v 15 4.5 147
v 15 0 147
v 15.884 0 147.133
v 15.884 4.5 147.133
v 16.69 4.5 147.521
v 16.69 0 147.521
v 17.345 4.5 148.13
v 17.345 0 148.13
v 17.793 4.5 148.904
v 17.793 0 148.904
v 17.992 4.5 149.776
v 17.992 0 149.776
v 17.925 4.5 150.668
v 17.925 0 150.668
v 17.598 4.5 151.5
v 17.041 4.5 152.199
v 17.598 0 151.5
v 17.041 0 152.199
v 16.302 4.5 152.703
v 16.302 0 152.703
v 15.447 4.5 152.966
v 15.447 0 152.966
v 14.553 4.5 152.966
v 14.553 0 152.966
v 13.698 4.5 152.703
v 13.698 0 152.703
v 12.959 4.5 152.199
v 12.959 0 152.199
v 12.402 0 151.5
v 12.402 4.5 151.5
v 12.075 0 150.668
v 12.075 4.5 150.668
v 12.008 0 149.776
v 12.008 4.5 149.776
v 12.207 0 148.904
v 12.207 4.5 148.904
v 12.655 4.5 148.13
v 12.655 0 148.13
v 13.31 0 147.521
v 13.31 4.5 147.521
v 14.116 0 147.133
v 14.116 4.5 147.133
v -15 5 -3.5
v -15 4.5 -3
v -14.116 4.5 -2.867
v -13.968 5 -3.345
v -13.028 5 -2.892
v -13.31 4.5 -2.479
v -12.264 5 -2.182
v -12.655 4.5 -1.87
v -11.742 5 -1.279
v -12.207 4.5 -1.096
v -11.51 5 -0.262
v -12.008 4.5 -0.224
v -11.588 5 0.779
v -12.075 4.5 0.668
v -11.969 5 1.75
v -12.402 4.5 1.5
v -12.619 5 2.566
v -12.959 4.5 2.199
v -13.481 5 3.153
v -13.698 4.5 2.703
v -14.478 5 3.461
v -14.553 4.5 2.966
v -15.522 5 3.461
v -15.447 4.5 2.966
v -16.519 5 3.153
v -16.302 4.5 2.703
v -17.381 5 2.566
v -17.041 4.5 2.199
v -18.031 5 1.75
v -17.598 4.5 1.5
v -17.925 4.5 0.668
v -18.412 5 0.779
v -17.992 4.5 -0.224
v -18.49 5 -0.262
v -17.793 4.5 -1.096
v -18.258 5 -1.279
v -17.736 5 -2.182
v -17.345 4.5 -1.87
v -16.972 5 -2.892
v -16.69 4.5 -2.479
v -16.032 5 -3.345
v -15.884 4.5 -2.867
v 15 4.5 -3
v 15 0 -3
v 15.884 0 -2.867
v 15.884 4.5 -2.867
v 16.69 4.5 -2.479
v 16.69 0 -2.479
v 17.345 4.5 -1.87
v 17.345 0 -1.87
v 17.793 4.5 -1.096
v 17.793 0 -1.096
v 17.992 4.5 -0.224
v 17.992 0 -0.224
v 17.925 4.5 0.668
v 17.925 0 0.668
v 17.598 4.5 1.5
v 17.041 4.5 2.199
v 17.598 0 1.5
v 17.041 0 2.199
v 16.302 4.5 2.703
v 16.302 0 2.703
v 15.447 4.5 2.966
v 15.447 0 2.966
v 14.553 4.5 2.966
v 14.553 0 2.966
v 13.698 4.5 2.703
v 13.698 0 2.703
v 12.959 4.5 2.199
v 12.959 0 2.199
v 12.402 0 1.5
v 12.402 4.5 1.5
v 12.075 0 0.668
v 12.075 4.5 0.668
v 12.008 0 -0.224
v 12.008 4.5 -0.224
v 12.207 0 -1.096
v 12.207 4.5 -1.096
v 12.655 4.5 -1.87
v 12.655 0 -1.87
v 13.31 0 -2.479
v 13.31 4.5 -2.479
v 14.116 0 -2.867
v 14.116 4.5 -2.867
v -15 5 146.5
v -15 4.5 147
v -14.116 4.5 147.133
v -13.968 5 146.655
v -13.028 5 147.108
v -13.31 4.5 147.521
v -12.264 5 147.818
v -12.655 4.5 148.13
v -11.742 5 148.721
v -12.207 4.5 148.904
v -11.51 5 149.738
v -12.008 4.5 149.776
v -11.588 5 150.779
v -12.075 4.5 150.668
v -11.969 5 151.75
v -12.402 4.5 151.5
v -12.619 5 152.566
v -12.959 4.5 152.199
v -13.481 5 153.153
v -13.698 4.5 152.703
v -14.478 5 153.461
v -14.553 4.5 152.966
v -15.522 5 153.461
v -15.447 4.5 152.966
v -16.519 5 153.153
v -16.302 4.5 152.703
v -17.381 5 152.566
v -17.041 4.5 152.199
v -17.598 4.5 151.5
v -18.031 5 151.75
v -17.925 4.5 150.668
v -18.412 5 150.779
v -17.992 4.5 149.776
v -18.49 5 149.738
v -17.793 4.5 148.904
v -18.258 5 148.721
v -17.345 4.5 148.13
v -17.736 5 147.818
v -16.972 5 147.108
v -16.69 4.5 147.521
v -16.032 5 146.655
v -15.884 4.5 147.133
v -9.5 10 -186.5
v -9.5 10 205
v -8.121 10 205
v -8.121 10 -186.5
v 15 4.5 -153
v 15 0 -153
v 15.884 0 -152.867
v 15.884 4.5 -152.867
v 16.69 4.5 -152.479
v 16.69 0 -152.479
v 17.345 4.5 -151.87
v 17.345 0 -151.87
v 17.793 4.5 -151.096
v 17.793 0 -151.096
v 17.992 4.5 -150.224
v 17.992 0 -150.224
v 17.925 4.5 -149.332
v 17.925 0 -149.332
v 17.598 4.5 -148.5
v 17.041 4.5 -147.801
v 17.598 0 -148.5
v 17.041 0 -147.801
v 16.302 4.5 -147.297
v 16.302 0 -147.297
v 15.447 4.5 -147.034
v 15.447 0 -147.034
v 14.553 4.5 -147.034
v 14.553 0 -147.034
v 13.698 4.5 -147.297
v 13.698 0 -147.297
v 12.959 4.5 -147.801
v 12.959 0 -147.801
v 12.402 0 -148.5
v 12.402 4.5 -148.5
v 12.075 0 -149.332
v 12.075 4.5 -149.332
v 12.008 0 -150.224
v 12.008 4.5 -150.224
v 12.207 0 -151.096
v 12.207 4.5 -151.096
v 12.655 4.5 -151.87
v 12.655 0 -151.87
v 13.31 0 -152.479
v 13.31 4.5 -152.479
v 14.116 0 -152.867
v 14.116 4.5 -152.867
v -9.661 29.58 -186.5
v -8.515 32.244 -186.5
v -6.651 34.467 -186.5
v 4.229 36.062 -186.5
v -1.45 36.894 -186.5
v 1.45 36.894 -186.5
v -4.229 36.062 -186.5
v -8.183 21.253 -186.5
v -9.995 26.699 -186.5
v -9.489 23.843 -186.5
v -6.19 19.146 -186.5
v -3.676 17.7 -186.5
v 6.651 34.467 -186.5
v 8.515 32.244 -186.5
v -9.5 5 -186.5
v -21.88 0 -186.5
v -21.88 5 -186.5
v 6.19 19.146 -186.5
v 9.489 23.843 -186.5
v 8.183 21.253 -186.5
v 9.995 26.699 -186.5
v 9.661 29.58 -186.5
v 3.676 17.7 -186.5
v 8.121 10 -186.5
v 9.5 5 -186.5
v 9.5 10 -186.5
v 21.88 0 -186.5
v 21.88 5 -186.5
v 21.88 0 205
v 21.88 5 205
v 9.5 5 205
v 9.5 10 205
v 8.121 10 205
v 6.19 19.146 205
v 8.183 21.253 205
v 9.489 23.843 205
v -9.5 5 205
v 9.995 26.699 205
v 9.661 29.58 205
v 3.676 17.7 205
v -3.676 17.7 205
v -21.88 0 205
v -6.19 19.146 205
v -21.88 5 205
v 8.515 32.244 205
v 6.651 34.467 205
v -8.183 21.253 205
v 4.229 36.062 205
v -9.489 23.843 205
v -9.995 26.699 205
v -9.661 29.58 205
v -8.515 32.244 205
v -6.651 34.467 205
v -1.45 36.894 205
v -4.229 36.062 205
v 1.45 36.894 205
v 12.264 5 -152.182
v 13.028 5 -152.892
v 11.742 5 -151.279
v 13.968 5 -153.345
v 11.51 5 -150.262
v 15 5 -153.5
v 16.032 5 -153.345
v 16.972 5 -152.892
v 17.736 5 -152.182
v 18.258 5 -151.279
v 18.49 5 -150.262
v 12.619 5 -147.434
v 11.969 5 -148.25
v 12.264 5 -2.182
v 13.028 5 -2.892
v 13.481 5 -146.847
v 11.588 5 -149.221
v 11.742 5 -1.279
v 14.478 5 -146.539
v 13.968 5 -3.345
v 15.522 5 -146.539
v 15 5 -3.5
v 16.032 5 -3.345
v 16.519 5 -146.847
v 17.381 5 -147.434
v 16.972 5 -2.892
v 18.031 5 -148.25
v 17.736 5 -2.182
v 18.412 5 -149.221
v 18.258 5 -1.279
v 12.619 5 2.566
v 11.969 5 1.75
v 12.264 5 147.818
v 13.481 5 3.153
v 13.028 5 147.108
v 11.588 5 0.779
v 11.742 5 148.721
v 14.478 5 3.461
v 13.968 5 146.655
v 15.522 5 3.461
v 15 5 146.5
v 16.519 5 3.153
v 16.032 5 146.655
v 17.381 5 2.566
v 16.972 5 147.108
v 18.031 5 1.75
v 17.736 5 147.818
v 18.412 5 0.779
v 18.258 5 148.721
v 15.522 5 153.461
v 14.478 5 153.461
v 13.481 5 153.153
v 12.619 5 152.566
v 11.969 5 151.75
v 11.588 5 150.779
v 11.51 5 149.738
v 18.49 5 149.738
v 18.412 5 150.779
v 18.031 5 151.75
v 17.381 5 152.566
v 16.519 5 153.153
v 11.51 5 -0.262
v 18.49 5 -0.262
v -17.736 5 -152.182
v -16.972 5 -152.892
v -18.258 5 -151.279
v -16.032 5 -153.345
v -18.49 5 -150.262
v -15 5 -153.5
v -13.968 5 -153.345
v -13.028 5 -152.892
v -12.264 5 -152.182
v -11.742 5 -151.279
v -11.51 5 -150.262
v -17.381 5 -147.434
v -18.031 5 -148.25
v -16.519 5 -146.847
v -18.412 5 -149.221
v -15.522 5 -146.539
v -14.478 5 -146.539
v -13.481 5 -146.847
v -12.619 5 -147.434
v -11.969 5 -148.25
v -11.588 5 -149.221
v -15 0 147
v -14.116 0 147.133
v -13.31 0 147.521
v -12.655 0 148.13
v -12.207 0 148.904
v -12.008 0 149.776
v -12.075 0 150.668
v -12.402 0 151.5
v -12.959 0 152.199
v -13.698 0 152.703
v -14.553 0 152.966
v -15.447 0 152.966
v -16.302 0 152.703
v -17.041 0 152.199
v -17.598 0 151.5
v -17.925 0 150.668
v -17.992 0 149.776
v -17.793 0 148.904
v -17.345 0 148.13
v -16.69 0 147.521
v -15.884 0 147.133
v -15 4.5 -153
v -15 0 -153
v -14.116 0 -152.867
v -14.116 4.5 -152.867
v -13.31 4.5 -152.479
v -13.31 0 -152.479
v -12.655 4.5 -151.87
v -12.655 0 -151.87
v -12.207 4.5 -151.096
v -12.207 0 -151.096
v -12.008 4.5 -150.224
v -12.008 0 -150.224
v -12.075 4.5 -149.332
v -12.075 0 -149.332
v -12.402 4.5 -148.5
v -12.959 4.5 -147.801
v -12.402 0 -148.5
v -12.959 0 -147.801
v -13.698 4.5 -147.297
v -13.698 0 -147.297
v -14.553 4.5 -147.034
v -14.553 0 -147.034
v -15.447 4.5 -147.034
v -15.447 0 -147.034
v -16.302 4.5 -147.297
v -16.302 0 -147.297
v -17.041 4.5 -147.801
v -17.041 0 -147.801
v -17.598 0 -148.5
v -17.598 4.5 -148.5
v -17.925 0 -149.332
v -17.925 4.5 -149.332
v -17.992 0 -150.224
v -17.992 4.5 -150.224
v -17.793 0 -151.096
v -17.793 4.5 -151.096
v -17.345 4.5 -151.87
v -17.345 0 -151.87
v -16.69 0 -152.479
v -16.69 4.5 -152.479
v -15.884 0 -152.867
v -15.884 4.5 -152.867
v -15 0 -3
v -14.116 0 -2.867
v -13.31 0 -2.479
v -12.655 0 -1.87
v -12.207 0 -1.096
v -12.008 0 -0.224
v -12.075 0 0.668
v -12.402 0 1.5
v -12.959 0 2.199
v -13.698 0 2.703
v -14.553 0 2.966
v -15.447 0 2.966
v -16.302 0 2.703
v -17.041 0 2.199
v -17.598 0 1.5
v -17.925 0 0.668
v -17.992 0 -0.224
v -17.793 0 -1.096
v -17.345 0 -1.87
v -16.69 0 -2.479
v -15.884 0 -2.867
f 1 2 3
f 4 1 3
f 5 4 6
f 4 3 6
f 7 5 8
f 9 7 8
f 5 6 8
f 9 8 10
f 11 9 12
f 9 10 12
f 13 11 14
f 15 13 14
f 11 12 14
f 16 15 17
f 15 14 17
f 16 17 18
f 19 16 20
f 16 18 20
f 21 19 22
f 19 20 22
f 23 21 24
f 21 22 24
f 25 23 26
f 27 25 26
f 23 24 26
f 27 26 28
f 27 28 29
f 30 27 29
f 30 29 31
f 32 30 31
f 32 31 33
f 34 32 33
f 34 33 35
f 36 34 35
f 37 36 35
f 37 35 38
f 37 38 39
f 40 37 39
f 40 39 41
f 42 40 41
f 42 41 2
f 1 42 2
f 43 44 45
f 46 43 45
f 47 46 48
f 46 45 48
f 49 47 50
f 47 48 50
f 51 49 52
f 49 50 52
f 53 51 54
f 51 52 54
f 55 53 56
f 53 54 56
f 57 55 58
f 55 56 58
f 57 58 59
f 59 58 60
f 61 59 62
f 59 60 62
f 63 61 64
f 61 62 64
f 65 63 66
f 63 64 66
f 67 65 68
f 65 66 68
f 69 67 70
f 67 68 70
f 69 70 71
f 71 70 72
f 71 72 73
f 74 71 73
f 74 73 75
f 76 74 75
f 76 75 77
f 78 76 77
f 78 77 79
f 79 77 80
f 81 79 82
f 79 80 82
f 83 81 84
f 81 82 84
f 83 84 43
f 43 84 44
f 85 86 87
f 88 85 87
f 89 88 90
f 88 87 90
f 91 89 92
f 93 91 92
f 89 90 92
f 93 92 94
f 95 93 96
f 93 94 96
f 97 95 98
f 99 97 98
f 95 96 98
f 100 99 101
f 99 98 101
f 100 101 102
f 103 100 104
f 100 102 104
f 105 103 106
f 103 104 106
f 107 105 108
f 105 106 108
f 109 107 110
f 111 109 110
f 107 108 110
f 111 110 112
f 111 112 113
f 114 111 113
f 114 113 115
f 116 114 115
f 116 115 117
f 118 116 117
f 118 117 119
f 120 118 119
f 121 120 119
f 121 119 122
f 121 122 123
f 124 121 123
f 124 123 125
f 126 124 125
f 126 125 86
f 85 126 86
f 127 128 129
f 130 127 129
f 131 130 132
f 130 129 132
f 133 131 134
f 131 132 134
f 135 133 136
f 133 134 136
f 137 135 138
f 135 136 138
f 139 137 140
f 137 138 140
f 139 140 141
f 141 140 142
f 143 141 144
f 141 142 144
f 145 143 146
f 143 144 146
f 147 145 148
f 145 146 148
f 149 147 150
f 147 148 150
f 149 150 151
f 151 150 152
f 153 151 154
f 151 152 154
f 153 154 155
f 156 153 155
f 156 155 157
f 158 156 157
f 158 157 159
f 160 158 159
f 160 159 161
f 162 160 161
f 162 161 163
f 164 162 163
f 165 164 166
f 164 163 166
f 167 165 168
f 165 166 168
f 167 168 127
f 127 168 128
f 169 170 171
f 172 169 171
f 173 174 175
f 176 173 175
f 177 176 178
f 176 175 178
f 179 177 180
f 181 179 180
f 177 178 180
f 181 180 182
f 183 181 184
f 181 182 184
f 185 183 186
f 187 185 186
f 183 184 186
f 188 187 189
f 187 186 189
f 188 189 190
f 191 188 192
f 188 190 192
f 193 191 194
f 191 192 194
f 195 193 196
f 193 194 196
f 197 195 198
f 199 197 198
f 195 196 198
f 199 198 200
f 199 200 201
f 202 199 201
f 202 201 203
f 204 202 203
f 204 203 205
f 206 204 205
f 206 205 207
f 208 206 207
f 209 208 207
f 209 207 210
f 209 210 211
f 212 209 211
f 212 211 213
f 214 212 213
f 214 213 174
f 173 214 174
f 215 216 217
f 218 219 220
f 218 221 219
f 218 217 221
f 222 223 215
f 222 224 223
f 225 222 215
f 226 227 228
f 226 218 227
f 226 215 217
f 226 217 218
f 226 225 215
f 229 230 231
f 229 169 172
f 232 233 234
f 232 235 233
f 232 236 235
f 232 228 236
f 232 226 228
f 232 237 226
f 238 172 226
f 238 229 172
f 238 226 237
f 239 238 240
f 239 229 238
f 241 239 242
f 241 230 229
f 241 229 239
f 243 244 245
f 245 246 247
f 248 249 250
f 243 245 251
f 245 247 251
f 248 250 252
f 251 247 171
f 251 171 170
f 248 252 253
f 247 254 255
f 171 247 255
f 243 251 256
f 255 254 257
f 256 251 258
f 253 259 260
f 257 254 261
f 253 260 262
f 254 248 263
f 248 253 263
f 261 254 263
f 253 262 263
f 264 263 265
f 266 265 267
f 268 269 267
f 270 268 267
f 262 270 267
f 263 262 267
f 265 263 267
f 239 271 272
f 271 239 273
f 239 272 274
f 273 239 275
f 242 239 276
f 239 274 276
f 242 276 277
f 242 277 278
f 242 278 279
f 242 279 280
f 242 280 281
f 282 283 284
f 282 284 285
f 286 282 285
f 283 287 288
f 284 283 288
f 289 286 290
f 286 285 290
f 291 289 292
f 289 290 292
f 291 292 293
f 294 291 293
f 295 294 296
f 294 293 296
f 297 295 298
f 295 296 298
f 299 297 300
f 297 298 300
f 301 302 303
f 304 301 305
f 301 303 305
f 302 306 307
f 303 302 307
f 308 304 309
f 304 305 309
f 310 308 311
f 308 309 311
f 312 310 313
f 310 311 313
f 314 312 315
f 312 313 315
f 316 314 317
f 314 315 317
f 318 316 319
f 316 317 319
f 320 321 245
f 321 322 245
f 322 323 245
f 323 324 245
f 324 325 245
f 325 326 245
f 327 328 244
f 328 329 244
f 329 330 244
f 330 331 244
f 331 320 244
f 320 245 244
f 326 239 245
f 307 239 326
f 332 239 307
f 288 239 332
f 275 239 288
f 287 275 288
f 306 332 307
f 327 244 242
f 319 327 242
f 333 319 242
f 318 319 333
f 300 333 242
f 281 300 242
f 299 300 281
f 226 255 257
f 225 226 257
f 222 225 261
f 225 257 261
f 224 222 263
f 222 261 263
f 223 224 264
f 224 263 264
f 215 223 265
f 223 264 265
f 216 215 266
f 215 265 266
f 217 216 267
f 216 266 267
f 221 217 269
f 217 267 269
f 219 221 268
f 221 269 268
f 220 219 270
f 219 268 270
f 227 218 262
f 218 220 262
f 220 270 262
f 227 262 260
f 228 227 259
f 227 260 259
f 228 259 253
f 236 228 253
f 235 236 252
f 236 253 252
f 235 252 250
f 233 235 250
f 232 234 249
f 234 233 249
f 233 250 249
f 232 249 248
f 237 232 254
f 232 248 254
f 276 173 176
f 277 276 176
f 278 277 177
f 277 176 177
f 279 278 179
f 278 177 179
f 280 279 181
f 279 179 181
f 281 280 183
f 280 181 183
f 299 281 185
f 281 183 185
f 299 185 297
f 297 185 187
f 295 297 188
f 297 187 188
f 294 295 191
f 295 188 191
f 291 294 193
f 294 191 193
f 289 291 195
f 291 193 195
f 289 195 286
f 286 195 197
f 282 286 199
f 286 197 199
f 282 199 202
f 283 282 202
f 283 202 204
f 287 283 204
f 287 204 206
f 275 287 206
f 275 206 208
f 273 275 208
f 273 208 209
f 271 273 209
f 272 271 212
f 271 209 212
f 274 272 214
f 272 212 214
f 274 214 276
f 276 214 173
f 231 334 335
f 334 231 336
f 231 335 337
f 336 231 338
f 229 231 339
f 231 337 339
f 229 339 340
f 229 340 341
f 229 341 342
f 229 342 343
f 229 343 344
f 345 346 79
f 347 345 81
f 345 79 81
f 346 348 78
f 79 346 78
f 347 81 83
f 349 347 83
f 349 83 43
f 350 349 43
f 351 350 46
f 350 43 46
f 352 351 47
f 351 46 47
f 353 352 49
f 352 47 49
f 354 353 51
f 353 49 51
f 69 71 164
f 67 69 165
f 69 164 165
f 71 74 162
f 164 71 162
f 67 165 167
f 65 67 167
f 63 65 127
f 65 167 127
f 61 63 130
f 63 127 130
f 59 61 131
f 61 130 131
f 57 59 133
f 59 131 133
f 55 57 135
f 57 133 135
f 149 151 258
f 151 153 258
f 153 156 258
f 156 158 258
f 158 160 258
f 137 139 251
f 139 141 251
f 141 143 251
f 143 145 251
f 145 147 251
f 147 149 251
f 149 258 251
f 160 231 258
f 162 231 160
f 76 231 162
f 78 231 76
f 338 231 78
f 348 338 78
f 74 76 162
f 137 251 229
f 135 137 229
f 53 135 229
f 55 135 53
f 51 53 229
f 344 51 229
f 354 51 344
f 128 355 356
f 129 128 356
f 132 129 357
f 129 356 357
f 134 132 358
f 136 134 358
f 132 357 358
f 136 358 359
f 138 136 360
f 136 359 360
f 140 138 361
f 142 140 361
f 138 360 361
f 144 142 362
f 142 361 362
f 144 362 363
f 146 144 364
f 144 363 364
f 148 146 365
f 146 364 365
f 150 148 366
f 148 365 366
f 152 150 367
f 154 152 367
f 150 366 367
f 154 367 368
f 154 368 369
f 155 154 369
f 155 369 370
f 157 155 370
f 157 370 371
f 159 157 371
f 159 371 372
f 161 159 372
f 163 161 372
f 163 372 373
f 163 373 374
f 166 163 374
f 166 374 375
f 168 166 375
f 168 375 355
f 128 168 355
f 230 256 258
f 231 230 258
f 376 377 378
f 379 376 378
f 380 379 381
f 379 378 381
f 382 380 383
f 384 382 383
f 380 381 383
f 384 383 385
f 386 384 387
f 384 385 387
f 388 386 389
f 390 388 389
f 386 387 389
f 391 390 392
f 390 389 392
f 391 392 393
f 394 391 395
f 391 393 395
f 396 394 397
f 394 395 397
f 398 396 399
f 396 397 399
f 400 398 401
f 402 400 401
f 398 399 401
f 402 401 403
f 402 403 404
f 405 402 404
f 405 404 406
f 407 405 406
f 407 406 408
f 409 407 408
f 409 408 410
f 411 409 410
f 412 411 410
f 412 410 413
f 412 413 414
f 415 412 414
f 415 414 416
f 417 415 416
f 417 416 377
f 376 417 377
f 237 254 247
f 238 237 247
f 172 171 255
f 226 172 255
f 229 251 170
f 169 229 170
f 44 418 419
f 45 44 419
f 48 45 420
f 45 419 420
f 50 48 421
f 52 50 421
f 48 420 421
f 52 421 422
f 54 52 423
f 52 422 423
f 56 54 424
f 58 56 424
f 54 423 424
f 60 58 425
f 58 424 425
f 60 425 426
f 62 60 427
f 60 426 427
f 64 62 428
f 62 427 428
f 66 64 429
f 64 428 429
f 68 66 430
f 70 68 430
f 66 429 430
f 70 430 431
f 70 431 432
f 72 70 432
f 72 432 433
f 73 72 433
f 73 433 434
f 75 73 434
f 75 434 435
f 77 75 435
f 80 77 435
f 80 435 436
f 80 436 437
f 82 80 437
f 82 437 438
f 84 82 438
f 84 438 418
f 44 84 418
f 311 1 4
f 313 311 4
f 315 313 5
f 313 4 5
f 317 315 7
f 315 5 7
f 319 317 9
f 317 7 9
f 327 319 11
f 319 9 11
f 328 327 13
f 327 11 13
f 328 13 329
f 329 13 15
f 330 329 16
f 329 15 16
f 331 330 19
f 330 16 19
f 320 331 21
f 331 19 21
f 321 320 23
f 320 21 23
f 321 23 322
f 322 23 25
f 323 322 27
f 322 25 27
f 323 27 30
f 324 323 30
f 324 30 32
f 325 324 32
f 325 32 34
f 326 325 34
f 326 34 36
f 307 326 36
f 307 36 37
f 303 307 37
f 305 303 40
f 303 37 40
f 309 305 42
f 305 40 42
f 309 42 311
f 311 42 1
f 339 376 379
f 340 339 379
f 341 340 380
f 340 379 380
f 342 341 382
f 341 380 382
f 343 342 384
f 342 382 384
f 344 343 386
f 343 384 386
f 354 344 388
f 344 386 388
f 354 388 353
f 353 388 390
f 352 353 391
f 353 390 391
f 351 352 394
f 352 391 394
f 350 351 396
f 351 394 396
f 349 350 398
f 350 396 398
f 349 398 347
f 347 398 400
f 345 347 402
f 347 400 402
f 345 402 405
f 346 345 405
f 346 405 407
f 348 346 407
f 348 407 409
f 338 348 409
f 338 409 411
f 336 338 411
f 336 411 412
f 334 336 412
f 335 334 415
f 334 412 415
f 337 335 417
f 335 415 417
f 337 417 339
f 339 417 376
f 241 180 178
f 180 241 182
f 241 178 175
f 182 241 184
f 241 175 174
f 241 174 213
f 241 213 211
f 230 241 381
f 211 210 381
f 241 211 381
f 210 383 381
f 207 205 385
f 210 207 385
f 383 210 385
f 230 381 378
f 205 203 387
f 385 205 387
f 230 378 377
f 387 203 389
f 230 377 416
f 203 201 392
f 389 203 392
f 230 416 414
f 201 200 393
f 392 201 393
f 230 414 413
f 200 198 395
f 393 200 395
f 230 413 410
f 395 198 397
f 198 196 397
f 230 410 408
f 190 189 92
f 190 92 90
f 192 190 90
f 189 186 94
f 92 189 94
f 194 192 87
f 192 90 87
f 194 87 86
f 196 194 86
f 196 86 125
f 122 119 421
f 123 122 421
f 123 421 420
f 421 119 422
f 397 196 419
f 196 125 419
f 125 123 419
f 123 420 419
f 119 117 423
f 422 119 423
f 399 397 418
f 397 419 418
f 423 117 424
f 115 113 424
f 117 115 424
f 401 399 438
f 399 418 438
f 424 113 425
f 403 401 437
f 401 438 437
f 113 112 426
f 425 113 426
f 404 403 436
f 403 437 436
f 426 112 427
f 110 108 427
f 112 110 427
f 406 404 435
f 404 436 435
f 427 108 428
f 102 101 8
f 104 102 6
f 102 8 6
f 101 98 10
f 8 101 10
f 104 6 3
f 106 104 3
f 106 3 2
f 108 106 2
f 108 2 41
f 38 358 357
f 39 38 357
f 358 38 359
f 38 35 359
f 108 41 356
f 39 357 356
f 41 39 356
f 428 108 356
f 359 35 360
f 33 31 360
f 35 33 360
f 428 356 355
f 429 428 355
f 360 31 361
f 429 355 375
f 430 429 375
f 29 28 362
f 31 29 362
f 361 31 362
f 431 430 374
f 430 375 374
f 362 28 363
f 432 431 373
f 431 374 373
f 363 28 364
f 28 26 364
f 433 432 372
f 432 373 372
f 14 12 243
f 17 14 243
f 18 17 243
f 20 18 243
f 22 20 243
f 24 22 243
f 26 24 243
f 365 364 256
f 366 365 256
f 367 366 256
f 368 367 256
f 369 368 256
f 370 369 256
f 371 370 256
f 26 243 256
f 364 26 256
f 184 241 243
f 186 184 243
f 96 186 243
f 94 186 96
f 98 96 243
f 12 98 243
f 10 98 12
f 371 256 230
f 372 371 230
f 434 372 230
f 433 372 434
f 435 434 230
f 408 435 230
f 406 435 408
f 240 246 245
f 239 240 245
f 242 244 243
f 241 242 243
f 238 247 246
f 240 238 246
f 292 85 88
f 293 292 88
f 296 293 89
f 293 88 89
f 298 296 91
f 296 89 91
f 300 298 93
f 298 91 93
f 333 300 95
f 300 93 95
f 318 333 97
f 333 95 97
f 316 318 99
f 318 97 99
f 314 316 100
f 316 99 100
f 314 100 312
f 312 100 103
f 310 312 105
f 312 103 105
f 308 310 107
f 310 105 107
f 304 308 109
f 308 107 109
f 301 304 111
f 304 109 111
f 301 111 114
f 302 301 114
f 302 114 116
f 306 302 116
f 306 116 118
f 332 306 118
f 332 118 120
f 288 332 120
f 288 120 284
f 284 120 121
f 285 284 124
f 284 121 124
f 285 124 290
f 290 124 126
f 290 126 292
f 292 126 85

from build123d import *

# Parameters (mm, degrees)
SALIENTE_EXTRUIR1_DEPTH = 205
CORTAR_EXTRUIR1_REACH   = 211.458
CROQUIS2_R              = 3
CHAFL_N1_SIZE           = 0.5
CROQUIS3_W              = 43.76
CROQUIS3_H              = 18.5
CORTAR_EXTRUIR2_DEPTH   = 210.458192487


with BuildPart() as part:
    # Croquis1 → Saliente-Extruir1 (new, symmetric)
    with BuildSketch(Plane.XY):
        with BuildLine():
            Line((-8.121192263, 10), (-3.67559519, 17.7))
            ThreePointArc((-3.67559519, 17.7), (0, 37), (3.67559519, 17.7))
            Line((3.67559519, 17.7), (8.121192263, 10))
            Line((8.121192263, 10), (9.5, 10))
            Line((9.5, 10), (9.5, 5))
            Line((9.5, 5), (21.88, 5))
            Line((21.88, 5), (21.88, 0))
            Line((21.88, 0), (-21.88, 0))
            Line((-21.88, 0), (-21.88, 5))
            Line((-21.88, 5), (-9.5, 5))
            Line((-9.5, 5), (-9.5, 10))
            Line((-9.5, 10), (-8.121192263, 10))
        make_face()
    extrude(amount=SALIENTE_EXTRUIR1_DEPTH, both=True)

    # Croquis2 → Cortar-Extruir1 (cut, up to next)
    with BuildSketch(Plane.XZ, mode=Mode.PRIVATE) as cortar_extruir1_sk1:
        with Locations(Location((15, 150, 0), (0, 0, 270))):
            Circle(CROQUIS2_R)
    cortar_extruir1_tool1 = extrude(cortar_extruir1_sk1.sketch, amount=-CORTAR_EXTRUIR1_REACH, mode=Mode.PRIVATE) & part.part
    # Croquis2 → Cortar-Extruir1 (cut, up to next)
    with BuildSketch(Plane.XZ, mode=Mode.PRIVATE) as cortar_extruir1_sk2:
        with Locations(Location((-15, 150, 0), (0, 0, 270))):
            Circle(CROQUIS2_R)
    cortar_extruir1_tool2 = extrude(cortar_extruir1_sk2.sketch, amount=-CORTAR_EXTRUIR1_REACH, mode=Mode.PRIVATE) & part.part
    # Croquis2 → Cortar-Extruir1 (cut, up to next)
    with BuildSketch(Plane.XZ, mode=Mode.PRIVATE) as cortar_extruir1_sk3:
        with Locations(Location((-15, 0, 0), (0, 0, 270))):
            Circle(CROQUIS2_R)
    cortar_extruir1_tool3 = extrude(cortar_extruir1_sk3.sketch, amount=-CORTAR_EXTRUIR1_REACH, mode=Mode.PRIVATE) & part.part
    # Croquis2 → Cortar-Extruir1 (cut, up to next)
    with BuildSketch(Plane.XZ, mode=Mode.PRIVATE) as cortar_extruir1_sk4:
        with Locations(Location((15, 0, 0), (0, 0, 270))):
            Circle(CROQUIS2_R)
    cortar_extruir1_tool4 = extrude(cortar_extruir1_sk4.sketch, amount=-CORTAR_EXTRUIR1_REACH, mode=Mode.PRIVATE) & part.part
    # Croquis2 → Cortar-Extruir1 (cut, up to next)
    with BuildSketch(Plane.XZ, mode=Mode.PRIVATE) as cortar_extruir1_sk5:
        with Locations(Location((15, -150, 0), (0, 0, 270))):
            Circle(CROQUIS2_R)
    cortar_extruir1_tool5 = extrude(cortar_extruir1_sk5.sketch, amount=-CORTAR_EXTRUIR1_REACH, mode=Mode.PRIVATE) & part.part
    # Croquis2 → Cortar-Extruir1 (cut, up to next)
    with BuildSketch(Plane.XZ, mode=Mode.PRIVATE) as cortar_extruir1_sk6:
        with Locations(Location((-15, -150, 0), (0, 0, 270))):
            Circle(CROQUIS2_R)
    cortar_extruir1_tool6 = extrude(cortar_extruir1_sk6.sketch, amount=-CORTAR_EXTRUIR1_REACH, mode=Mode.PRIVATE) & part.part
    add(cortar_extruir1_tool1.solids().sort_by_distance((15, 0, 150))[0], mode=Mode.SUBTRACT)
    add(cortar_extruir1_tool2.solids().sort_by_distance((-15, 0, 150))[0], mode=Mode.SUBTRACT)
    add(cortar_extruir1_tool3.solids().sort_by_distance((-15, 0, 0))[0], mode=Mode.SUBTRACT)
    add(cortar_extruir1_tool4.solids().sort_by_distance((15, 0, 0))[0], mode=Mode.SUBTRACT)
    add(cortar_extruir1_tool5.solids().sort_by_distance((15, 0, -150))[0], mode=Mode.SUBTRACT)
    add(cortar_extruir1_tool6.solids().sort_by_distance((-15, 0, -150))[0], mode=Mode.SUBTRACT)

    # Chaflán1
    chafl_n1_edges = [part.edges().sort_by_distance(p)[0] for p in [
        (-15, 5, 153),
        (-15, 5, 3),
        (15, 5, 3),
        (15, 5, -147),
        (-15, 5, -147),
        (15, 5, 153),
    ]]
    chamfer(chafl_n1_edges, length=CHAFL_N1_SIZE)

    # Croquis3 → Cortar-Extruir2 (cut, through all)
    with BuildSketch(Plane.XZ):
        with Locations((0, -195.75)):
            Rectangle(CROQUIS3_W, CROQUIS3_H)
    extrude(amount=-CORTAR_EXTRUIR2_DEPTH, mode=Mode.SUBTRACT)


solid = part.part
